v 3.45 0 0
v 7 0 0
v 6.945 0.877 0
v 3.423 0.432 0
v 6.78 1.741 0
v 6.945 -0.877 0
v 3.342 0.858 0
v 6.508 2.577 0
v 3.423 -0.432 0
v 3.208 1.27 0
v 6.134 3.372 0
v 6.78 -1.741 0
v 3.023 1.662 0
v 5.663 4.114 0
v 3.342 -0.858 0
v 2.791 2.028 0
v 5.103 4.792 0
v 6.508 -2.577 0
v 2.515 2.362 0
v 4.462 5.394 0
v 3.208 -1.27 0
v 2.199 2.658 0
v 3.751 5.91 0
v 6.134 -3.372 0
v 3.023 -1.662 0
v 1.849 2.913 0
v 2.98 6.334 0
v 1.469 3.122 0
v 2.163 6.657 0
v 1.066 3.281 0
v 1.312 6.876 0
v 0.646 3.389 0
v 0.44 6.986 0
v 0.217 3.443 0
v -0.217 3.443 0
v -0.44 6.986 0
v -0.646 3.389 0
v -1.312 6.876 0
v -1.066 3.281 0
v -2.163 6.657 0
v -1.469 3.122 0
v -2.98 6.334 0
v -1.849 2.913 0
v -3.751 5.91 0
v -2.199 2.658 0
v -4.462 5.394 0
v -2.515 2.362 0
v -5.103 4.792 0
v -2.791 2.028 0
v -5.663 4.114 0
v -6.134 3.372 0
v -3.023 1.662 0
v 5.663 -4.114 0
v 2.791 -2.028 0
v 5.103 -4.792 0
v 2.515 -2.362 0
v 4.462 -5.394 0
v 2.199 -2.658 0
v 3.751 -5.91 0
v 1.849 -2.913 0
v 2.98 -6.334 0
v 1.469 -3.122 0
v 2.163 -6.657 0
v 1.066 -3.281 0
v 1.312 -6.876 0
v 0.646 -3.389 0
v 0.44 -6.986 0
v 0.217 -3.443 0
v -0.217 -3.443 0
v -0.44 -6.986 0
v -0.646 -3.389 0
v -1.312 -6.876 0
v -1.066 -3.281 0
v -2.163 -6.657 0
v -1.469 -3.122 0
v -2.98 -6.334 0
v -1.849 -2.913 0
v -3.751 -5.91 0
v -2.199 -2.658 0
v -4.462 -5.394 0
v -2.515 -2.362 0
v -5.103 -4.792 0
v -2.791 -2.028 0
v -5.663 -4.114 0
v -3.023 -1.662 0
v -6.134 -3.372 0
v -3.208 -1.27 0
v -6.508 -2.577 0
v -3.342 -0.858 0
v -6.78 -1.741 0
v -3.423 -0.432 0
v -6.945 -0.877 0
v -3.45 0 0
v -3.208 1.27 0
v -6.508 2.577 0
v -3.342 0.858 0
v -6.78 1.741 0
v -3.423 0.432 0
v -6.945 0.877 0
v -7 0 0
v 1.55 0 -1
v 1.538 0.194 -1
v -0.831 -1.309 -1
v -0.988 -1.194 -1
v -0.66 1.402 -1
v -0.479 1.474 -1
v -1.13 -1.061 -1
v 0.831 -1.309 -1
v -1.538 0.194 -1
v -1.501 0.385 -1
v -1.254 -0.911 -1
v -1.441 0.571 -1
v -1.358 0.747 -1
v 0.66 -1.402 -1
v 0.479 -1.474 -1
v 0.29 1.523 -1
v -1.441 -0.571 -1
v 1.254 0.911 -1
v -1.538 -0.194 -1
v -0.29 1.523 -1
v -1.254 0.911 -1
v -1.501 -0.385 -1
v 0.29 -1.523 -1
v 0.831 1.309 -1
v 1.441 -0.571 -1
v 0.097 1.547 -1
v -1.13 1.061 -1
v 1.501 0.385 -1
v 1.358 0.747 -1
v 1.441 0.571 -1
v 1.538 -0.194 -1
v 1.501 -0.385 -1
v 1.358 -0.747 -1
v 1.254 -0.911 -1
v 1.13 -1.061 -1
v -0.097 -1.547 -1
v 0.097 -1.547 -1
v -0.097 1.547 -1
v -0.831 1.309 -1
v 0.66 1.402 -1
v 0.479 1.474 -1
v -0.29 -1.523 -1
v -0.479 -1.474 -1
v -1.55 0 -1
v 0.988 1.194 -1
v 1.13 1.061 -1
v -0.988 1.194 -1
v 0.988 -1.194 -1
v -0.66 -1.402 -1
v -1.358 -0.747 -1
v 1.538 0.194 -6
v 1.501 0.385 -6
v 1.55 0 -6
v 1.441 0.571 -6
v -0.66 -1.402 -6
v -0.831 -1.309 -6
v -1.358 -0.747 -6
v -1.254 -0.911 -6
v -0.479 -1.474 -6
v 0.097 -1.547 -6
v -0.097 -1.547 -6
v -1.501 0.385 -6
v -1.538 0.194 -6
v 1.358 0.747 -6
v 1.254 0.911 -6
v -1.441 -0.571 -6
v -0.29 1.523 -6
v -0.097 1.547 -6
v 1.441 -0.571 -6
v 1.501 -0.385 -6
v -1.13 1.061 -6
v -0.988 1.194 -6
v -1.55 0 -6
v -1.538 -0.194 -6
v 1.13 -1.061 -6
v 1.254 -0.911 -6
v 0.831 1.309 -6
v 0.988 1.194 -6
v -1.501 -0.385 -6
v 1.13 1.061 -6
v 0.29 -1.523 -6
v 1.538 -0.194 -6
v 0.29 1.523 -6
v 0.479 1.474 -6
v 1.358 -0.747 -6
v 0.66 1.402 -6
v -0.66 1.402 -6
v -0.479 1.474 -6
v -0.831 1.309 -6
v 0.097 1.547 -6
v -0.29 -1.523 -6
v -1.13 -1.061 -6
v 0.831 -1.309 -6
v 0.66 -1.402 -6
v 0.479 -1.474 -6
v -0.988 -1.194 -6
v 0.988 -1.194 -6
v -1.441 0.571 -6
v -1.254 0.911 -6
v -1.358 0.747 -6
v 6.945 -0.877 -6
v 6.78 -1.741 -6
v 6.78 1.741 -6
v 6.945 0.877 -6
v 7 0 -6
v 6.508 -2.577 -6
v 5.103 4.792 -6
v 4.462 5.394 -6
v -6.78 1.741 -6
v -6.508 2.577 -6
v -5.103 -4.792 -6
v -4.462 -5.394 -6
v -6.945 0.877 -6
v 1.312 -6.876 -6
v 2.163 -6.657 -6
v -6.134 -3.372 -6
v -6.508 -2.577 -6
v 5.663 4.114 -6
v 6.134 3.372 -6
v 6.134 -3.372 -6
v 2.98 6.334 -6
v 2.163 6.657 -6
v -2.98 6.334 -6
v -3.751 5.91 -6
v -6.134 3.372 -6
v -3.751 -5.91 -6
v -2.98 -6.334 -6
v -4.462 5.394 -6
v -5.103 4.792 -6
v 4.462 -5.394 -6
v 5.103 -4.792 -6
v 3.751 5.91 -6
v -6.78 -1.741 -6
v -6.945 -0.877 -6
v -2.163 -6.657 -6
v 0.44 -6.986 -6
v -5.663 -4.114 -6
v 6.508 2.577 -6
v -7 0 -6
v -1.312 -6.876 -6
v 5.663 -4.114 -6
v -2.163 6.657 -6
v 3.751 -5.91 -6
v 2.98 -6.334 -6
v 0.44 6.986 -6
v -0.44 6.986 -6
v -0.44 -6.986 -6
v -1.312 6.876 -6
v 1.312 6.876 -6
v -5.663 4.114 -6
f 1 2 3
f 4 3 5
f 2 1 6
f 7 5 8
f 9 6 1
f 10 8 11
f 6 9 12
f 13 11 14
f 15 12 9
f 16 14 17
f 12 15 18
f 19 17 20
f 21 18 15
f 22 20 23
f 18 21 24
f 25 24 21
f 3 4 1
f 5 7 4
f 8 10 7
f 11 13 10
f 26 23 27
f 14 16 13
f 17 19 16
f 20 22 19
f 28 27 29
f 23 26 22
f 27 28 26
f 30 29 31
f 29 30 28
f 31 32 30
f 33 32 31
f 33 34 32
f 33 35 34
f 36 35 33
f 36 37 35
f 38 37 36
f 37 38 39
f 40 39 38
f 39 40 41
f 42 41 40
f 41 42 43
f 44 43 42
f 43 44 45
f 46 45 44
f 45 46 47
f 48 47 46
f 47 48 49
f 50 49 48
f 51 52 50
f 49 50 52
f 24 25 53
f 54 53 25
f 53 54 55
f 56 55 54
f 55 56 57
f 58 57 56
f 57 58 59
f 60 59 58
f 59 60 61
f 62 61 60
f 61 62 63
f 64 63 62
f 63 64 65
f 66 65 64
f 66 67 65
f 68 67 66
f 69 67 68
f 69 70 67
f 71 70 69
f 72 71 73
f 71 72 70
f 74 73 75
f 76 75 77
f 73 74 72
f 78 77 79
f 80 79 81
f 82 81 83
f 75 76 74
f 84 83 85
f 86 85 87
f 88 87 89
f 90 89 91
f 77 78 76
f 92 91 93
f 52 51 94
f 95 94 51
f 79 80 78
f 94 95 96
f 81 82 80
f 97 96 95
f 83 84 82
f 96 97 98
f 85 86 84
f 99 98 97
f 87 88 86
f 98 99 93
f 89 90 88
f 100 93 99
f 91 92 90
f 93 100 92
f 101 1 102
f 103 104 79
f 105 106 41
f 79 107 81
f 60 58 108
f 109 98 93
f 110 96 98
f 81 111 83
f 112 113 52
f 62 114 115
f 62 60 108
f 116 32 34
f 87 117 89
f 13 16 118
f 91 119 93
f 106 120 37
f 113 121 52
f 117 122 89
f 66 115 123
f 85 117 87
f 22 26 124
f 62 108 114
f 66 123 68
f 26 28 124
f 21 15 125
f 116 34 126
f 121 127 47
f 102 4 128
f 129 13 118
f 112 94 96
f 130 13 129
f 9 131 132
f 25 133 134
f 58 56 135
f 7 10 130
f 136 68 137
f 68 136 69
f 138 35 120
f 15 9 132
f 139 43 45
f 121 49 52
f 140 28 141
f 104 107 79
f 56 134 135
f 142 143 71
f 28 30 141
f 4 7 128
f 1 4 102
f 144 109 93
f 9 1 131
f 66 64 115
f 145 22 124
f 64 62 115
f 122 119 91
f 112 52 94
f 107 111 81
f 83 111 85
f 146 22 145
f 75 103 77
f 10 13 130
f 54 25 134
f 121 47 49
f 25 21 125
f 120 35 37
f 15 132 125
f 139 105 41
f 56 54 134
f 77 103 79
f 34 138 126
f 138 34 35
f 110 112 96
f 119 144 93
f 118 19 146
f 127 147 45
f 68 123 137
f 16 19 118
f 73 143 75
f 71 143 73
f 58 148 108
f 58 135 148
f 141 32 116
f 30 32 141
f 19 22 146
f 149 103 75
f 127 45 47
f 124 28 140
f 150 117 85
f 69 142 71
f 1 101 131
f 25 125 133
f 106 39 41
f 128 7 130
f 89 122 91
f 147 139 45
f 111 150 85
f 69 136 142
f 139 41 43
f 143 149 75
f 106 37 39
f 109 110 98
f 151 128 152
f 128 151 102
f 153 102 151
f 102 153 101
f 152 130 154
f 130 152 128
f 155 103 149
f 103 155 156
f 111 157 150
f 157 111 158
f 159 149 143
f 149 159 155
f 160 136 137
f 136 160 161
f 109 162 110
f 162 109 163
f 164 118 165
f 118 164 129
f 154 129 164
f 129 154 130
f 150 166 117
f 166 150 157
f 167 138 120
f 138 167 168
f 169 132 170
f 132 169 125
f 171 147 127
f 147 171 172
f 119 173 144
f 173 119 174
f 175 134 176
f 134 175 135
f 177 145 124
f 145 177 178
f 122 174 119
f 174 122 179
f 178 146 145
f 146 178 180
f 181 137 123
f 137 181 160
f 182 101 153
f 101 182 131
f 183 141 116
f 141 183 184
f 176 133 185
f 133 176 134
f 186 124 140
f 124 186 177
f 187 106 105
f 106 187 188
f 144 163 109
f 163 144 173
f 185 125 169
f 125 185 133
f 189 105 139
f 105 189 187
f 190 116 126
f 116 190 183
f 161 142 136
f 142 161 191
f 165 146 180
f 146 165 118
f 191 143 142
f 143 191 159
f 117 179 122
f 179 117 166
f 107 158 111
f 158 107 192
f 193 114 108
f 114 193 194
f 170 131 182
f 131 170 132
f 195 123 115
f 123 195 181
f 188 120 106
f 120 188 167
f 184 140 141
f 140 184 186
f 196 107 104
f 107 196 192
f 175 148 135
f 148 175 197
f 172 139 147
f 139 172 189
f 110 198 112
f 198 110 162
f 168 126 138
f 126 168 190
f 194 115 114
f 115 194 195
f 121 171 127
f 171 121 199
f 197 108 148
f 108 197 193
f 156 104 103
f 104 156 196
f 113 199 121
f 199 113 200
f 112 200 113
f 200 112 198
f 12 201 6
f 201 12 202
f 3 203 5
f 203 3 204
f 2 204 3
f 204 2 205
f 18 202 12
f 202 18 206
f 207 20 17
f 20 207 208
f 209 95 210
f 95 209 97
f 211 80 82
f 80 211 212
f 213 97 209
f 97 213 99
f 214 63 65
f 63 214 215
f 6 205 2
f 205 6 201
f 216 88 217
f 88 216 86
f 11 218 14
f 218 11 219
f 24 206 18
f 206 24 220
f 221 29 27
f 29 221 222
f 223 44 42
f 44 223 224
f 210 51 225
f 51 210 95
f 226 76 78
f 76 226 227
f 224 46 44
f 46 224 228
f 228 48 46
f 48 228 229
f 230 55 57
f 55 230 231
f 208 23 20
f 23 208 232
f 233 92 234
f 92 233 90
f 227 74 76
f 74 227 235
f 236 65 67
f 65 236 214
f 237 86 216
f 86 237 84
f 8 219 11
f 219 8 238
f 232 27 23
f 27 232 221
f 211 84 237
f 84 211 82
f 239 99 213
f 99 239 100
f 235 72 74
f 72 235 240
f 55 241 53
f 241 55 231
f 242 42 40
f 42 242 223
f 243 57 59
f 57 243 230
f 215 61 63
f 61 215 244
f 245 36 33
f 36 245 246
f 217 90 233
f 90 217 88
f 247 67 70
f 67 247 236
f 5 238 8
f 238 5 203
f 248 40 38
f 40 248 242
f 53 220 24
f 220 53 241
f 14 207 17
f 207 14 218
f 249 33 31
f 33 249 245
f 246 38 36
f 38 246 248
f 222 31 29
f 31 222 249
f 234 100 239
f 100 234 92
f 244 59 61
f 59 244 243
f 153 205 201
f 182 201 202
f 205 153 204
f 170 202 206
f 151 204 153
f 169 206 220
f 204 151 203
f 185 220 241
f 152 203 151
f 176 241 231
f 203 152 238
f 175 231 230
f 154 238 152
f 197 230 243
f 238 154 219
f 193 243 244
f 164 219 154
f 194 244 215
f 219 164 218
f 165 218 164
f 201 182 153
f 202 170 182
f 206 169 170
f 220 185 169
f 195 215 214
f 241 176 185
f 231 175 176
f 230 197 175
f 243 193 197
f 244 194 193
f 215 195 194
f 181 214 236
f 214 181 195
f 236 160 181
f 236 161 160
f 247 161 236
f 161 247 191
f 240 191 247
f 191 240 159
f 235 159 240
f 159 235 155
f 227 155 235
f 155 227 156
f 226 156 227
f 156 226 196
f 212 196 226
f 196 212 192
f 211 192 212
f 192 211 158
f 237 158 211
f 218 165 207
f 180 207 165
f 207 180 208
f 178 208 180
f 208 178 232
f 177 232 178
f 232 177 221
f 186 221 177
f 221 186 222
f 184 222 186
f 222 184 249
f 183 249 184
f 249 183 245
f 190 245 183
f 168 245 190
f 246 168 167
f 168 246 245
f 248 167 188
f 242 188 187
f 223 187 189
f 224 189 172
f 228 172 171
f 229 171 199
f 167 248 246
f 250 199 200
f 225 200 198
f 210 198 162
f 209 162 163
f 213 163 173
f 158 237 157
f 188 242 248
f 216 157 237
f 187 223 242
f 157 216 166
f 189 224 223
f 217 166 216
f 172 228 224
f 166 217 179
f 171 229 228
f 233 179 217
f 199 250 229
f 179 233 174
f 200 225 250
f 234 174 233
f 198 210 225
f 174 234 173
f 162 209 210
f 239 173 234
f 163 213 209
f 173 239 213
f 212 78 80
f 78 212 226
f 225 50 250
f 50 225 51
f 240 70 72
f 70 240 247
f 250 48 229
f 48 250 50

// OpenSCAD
$fn = 50;

difference() {
	union() {
		translate(v = [0, 0, -6.0]) {
			cylinder(h = 6, r = 7.0);
		}
	}
	union() {
		translate(v = [0, 0, 0]) {
			rotate(a = [0, 0, 0]) {
				difference() {
					union() {
						translate(v = [0, 0, -9.0]) {
							cylinder(h = 9, r = 1.25);
						}
						translate(v = [0, 0, -1.0]) {
							cylinder(h = 1.0, r1 = 1.55, r2 = 3.45);
						}
						translate(v = [0, 0, -9.0]) {
							cylinder(h = 9, r = 1.55);
						}
						translate(v = [0, 0, -9.0]) {
							cylinder(h = 9, r = 1.25);
						}
					}
					union();
				}
			}
		}
	}
}
